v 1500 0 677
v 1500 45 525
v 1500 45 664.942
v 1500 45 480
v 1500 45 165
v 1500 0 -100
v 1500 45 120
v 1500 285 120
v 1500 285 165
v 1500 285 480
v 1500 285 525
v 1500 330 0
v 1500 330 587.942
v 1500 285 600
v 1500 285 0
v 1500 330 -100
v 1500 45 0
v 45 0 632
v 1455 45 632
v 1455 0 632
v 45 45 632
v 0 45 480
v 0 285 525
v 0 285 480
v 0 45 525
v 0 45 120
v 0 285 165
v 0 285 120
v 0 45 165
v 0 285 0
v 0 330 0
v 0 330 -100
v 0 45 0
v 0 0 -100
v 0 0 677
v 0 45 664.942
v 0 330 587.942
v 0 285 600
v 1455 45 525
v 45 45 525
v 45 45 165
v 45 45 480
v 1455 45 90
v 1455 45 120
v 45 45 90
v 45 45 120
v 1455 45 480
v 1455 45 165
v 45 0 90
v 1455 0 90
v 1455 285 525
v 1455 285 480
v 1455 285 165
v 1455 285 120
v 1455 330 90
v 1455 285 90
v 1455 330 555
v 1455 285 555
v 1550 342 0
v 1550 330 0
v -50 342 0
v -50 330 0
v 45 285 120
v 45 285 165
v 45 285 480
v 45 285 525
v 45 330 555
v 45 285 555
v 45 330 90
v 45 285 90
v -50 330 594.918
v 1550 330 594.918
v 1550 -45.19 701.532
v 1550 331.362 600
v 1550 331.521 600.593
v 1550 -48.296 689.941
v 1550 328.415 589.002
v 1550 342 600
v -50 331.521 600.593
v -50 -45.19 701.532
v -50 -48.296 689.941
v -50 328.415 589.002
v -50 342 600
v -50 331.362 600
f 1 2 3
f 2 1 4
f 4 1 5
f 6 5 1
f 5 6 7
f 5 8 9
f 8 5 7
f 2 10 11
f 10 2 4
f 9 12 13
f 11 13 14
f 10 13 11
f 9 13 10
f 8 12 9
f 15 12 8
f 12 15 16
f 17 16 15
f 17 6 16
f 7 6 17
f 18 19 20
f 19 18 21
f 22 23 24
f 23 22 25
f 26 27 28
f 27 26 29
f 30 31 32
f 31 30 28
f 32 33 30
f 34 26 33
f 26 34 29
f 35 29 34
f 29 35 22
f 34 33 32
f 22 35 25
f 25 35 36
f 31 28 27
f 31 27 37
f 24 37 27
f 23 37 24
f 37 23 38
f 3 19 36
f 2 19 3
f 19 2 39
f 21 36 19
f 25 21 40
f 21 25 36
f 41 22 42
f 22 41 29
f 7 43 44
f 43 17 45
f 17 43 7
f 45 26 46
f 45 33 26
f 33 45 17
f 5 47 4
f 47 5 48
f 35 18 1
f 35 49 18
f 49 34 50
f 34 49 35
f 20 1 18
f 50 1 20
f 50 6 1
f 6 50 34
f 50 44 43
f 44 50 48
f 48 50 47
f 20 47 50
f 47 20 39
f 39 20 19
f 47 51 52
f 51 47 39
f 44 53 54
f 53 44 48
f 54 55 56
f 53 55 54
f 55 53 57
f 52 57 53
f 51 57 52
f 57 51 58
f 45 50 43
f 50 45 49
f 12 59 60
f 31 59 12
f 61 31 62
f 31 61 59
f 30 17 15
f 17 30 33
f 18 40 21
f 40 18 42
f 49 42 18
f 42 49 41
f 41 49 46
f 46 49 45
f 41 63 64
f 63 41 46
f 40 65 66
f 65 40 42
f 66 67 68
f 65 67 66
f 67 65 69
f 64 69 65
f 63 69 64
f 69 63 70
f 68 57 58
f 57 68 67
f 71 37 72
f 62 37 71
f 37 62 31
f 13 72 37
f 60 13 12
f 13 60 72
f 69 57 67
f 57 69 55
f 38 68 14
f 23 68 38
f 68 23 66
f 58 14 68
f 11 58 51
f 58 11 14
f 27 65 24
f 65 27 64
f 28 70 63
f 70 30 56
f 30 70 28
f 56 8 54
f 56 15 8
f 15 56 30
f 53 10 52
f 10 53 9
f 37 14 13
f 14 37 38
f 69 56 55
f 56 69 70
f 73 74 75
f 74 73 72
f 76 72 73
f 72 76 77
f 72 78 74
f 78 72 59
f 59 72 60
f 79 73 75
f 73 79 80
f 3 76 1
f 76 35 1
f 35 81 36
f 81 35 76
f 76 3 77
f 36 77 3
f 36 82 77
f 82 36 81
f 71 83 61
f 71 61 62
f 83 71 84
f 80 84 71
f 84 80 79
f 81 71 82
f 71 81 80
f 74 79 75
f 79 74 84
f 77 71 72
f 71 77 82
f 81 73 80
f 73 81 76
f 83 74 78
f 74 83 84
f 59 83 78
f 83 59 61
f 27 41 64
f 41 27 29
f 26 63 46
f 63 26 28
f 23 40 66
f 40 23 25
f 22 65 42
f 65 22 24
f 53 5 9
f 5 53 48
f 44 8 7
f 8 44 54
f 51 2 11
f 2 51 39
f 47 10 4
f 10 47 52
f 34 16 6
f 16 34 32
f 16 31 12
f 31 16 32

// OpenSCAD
dim_24w = 45;
dim_24h = 90;
ang_roof = 15;
dim_ang_offset = 77;
dim_height = 600;
dim_lower_brace = 120;
dim_upper_brace = dim_height - 120;

dim_base_w = 1500;
dim_base_d = 330;

//color([ 0.5, 0.5, 0.5]){
	face(w=dim_base_w,h=dim_height + dim_ang_offset);
	translate([0,dim_base_d - dim_24w,0])face(w=dim_base_w,h=dim_height);
	translate([dim_24w, dim_24w, dim_lower_brace]) rotate([0,0,90])half(dim_base_d - dim_24h, "Spreader");
	translate([dim_24w, dim_24w, dim_upper_brace]) rotate([0,0,90])half(dim_base_d - dim_24h, "Spreader");
	translate([dim_base_w, dim_24w, dim_lower_brace]) rotate([0,0,90])half(dim_base_d - dim_24h, "Spreader");
	translate([dim_base_w, dim_24w, dim_upper_brace]) rotate([0,0,90])half(dim_base_d - dim_24h, "Spreader");
//}

color([ 0, 0.5, 0]){
	translate([0,0,-100])cube([dim_base_w, dim_base_d, 100]);
}
color([ 0, 0, 0.9]){
	translate([0,0,dim_height + dim_ang_offset])rotate([-ang_roof,0,0])translate([-50,-50,0])cube([dim_base_w + 100, dim_base_d + 60, 12]);
	translate([-50, dim_base_d, 0])cube([dim_base_w + 100, 12, dim_height]);
}

module full(w, reason){
	cube([w, dim_24w, dim_24h]);
	echo(reason, "2x4 x ", w);
}
module half(w, reason){
	cube([w, dim_24w, dim_24w]);
	echo(reason, "2x2 x ", w);
}

module face(w ,h){

	translate([dim_24w, 0, 0])full(w - dim_24h, "Front joist");
	translate([dim_24w,0,0])rotate([0,-90,0])half(h - dim_24w, "Front post");
	translate([w, 0, 0])rotate([0,-90,0])half(h - dim_24w, "Front post");
	
	translate([0, 0, h - dim_24w]){
		difference(){
			half(w, "Roof");
			translate([-0.5 * w,0,dim_24w])rotate([-ang_roof, 0, 0])cube([2 * w, dim_24h, dim_24h]);
		}
	}
}

module smallface(w ,h){

	translate([dim_24w, 0, 0])half(w - dim_24h, "Rear joist");
	translate([dim_24w,0,0])rotate([0,-90,0])half(h, "Back post");
	translate([w, 0, 0])rotate([0,-90,0])half(h, "Back post");
	
	translate([0, 0, h - dim_24w]){
		difference(){
			half(w, "Roof");
			translate([-0.5 * w,0,dim_24w])rotate([-ang_roof, 0, 0])cube([2 * w, dim_24h, dim_24h]);
		}
	}
}
